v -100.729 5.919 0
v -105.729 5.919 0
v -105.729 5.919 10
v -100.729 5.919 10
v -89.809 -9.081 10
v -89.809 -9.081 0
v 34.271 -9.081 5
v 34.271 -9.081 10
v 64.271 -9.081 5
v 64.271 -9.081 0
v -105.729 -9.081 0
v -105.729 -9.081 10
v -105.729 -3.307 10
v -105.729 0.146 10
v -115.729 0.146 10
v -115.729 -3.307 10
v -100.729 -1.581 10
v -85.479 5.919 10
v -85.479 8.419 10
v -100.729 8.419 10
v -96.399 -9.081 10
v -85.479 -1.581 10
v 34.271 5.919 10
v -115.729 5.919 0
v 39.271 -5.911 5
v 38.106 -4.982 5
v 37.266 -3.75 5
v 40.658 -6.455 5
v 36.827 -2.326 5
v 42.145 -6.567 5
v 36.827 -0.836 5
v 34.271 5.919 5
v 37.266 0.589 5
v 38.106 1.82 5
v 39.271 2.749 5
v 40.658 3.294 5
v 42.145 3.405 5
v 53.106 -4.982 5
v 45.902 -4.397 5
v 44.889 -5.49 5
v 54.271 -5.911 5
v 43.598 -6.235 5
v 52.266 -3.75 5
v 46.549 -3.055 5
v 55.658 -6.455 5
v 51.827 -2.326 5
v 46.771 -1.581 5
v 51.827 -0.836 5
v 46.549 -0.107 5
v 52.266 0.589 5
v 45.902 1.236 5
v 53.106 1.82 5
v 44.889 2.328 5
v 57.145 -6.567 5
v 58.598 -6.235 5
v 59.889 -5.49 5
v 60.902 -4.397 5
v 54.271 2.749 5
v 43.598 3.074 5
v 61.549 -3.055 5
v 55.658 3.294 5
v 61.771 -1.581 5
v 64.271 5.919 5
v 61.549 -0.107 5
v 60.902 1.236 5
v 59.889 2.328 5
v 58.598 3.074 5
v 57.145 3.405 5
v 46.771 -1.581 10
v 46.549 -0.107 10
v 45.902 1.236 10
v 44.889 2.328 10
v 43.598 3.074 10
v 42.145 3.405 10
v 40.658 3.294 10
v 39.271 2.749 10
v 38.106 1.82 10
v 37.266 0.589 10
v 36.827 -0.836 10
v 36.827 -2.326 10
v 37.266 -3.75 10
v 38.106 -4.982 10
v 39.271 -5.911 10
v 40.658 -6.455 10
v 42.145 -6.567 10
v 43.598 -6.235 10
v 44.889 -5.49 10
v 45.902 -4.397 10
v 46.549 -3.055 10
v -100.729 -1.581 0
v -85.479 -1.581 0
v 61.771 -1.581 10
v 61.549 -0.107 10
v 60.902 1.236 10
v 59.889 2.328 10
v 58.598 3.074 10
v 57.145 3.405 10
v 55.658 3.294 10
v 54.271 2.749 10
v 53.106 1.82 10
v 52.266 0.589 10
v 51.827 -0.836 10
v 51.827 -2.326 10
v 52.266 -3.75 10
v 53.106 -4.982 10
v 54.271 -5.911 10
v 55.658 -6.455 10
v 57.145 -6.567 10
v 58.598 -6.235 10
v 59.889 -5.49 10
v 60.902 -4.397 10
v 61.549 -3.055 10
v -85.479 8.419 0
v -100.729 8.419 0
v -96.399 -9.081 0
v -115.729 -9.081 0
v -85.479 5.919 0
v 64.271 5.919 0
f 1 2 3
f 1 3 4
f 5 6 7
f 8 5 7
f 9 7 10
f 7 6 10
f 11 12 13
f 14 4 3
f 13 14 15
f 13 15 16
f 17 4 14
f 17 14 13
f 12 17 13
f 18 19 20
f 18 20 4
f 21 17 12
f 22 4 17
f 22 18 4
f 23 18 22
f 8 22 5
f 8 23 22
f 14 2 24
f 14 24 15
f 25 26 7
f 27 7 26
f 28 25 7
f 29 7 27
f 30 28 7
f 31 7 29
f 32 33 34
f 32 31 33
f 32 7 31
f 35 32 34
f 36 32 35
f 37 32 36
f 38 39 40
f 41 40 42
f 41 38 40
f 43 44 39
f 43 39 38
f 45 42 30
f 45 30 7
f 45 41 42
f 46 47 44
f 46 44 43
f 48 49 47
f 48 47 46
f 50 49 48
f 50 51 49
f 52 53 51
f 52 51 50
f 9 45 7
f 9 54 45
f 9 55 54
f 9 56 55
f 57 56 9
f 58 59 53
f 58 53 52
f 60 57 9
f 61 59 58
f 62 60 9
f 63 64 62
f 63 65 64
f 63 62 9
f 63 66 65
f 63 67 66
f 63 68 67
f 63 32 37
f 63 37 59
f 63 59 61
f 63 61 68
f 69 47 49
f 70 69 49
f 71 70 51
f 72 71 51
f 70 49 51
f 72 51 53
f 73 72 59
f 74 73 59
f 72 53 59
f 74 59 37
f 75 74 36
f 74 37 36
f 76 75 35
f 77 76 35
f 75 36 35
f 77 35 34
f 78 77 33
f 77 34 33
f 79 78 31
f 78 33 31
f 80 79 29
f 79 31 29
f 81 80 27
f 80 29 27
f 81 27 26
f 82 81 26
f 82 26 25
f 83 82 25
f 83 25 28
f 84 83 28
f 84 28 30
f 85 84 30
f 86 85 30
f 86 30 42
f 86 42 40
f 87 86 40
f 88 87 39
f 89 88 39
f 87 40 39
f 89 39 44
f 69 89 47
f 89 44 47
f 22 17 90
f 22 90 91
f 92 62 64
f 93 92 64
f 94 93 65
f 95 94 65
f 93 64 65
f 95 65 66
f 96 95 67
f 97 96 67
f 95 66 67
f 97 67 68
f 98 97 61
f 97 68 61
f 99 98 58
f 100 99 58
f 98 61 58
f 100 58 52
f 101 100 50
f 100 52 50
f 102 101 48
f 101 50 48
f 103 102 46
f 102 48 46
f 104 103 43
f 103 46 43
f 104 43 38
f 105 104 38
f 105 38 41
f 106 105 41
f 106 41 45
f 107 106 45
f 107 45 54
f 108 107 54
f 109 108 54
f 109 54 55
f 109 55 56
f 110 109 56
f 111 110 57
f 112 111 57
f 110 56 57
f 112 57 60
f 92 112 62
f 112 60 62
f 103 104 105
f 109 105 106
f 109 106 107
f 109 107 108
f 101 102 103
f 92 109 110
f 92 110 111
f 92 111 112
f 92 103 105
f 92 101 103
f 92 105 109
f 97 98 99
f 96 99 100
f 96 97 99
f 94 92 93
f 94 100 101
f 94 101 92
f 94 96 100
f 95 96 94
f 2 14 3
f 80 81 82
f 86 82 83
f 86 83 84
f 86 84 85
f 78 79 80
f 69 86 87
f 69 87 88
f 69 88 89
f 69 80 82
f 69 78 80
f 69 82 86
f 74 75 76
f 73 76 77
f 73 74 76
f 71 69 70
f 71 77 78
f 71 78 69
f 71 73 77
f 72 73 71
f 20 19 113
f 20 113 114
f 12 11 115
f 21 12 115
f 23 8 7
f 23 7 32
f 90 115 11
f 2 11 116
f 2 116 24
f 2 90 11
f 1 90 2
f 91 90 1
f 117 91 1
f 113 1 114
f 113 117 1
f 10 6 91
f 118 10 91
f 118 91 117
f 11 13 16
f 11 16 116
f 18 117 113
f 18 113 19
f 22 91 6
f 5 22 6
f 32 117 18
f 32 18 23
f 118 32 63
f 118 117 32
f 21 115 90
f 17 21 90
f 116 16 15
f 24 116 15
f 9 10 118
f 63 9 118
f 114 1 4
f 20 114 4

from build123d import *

# Parameters (mm, degrees)
SKETCH_W        = 170
SKETCH_H        = 15
PAD_DEPTH       = 10
SKETCH001_W     = 35
SKETCH001_H     = 25
POCKET_DEPTH    = 5
SKETCH002_R     = 5
PAD001_DEPTH    = 5
PAD002_DEPTH    = 10
POCKET001_DEPTH = 10
SKETCH005_W     = 15.25
SKETCH005_H     = 10
PAD003_DEPTH    = 2.5


with BuildPart() as part:
    # Sketch → Pad (new body)
    with BuildSketch(Plane.XY):
        with Locations((-20.728933, -1.58076)):
            Rectangle(SKETCH_W, SKETCH_H)
    extrude(amount=PAD_DEPTH)

    # Sketch001 (on Face6 of Pad) → Pocket (cut)
    with BuildSketch(Plane.XY.offset(10)):
        with Locations((51.771067, -1.58076)):
            Rectangle(SKETCH001_W, SKETCH001_H)
    extrude(amount=-POCKET_DEPTH, mode=Mode.SUBTRACT)

    # Sketch002 (on Face7 of Pocket) → Pad001 (join)
    with BuildSketch(Plane.XY.offset(5)):
        with Locations((56.771067, -1.58076)):
            Circle(SKETCH002_R)
        with Locations((41.771067, -1.58076)):
            Circle(SKETCH002_R)
    extrude(amount=PAD001_DEPTH)

    # Sketch003 (on Face1 of Pad001) → Pad002 (join)
    with BuildSketch(Plane(origin=(-105.728933, 0, 0), x_dir=(0, -1, 0), z_dir=(-1, 0, 0))):
        Polygon((-5.91924, 0), (-0.145737, 10), (3.307257, 10), (9.08076, 0), align=None)
    extrude(amount=PAD002_DEPTH)

    # Sketch004 (on Face3 of Pad002) → Pocket001 (cut)
    with BuildSketch(Plane.XY.offset(10)):
        Polygon((-93.103933, -14.787648), (-100.728933, -1.58076), (-85.478933, -1.58076), align=None)
    extrude(amount=-POCKET001_DEPTH, mode=Mode.SUBTRACT)

    # Sketch005 (on Face9 of Pocket001) → Pad003 (join)
    with BuildSketch(Plane(origin=(0, 5.91924, 0), x_dir=(-1, 0, 0), z_dir=(0, 1, 0))):
        with Locations((93.103933, 5)):
            Rectangle(SKETCH005_W, SKETCH005_H)
    extrude(amount=PAD003_DEPTH)


solid = part.part
